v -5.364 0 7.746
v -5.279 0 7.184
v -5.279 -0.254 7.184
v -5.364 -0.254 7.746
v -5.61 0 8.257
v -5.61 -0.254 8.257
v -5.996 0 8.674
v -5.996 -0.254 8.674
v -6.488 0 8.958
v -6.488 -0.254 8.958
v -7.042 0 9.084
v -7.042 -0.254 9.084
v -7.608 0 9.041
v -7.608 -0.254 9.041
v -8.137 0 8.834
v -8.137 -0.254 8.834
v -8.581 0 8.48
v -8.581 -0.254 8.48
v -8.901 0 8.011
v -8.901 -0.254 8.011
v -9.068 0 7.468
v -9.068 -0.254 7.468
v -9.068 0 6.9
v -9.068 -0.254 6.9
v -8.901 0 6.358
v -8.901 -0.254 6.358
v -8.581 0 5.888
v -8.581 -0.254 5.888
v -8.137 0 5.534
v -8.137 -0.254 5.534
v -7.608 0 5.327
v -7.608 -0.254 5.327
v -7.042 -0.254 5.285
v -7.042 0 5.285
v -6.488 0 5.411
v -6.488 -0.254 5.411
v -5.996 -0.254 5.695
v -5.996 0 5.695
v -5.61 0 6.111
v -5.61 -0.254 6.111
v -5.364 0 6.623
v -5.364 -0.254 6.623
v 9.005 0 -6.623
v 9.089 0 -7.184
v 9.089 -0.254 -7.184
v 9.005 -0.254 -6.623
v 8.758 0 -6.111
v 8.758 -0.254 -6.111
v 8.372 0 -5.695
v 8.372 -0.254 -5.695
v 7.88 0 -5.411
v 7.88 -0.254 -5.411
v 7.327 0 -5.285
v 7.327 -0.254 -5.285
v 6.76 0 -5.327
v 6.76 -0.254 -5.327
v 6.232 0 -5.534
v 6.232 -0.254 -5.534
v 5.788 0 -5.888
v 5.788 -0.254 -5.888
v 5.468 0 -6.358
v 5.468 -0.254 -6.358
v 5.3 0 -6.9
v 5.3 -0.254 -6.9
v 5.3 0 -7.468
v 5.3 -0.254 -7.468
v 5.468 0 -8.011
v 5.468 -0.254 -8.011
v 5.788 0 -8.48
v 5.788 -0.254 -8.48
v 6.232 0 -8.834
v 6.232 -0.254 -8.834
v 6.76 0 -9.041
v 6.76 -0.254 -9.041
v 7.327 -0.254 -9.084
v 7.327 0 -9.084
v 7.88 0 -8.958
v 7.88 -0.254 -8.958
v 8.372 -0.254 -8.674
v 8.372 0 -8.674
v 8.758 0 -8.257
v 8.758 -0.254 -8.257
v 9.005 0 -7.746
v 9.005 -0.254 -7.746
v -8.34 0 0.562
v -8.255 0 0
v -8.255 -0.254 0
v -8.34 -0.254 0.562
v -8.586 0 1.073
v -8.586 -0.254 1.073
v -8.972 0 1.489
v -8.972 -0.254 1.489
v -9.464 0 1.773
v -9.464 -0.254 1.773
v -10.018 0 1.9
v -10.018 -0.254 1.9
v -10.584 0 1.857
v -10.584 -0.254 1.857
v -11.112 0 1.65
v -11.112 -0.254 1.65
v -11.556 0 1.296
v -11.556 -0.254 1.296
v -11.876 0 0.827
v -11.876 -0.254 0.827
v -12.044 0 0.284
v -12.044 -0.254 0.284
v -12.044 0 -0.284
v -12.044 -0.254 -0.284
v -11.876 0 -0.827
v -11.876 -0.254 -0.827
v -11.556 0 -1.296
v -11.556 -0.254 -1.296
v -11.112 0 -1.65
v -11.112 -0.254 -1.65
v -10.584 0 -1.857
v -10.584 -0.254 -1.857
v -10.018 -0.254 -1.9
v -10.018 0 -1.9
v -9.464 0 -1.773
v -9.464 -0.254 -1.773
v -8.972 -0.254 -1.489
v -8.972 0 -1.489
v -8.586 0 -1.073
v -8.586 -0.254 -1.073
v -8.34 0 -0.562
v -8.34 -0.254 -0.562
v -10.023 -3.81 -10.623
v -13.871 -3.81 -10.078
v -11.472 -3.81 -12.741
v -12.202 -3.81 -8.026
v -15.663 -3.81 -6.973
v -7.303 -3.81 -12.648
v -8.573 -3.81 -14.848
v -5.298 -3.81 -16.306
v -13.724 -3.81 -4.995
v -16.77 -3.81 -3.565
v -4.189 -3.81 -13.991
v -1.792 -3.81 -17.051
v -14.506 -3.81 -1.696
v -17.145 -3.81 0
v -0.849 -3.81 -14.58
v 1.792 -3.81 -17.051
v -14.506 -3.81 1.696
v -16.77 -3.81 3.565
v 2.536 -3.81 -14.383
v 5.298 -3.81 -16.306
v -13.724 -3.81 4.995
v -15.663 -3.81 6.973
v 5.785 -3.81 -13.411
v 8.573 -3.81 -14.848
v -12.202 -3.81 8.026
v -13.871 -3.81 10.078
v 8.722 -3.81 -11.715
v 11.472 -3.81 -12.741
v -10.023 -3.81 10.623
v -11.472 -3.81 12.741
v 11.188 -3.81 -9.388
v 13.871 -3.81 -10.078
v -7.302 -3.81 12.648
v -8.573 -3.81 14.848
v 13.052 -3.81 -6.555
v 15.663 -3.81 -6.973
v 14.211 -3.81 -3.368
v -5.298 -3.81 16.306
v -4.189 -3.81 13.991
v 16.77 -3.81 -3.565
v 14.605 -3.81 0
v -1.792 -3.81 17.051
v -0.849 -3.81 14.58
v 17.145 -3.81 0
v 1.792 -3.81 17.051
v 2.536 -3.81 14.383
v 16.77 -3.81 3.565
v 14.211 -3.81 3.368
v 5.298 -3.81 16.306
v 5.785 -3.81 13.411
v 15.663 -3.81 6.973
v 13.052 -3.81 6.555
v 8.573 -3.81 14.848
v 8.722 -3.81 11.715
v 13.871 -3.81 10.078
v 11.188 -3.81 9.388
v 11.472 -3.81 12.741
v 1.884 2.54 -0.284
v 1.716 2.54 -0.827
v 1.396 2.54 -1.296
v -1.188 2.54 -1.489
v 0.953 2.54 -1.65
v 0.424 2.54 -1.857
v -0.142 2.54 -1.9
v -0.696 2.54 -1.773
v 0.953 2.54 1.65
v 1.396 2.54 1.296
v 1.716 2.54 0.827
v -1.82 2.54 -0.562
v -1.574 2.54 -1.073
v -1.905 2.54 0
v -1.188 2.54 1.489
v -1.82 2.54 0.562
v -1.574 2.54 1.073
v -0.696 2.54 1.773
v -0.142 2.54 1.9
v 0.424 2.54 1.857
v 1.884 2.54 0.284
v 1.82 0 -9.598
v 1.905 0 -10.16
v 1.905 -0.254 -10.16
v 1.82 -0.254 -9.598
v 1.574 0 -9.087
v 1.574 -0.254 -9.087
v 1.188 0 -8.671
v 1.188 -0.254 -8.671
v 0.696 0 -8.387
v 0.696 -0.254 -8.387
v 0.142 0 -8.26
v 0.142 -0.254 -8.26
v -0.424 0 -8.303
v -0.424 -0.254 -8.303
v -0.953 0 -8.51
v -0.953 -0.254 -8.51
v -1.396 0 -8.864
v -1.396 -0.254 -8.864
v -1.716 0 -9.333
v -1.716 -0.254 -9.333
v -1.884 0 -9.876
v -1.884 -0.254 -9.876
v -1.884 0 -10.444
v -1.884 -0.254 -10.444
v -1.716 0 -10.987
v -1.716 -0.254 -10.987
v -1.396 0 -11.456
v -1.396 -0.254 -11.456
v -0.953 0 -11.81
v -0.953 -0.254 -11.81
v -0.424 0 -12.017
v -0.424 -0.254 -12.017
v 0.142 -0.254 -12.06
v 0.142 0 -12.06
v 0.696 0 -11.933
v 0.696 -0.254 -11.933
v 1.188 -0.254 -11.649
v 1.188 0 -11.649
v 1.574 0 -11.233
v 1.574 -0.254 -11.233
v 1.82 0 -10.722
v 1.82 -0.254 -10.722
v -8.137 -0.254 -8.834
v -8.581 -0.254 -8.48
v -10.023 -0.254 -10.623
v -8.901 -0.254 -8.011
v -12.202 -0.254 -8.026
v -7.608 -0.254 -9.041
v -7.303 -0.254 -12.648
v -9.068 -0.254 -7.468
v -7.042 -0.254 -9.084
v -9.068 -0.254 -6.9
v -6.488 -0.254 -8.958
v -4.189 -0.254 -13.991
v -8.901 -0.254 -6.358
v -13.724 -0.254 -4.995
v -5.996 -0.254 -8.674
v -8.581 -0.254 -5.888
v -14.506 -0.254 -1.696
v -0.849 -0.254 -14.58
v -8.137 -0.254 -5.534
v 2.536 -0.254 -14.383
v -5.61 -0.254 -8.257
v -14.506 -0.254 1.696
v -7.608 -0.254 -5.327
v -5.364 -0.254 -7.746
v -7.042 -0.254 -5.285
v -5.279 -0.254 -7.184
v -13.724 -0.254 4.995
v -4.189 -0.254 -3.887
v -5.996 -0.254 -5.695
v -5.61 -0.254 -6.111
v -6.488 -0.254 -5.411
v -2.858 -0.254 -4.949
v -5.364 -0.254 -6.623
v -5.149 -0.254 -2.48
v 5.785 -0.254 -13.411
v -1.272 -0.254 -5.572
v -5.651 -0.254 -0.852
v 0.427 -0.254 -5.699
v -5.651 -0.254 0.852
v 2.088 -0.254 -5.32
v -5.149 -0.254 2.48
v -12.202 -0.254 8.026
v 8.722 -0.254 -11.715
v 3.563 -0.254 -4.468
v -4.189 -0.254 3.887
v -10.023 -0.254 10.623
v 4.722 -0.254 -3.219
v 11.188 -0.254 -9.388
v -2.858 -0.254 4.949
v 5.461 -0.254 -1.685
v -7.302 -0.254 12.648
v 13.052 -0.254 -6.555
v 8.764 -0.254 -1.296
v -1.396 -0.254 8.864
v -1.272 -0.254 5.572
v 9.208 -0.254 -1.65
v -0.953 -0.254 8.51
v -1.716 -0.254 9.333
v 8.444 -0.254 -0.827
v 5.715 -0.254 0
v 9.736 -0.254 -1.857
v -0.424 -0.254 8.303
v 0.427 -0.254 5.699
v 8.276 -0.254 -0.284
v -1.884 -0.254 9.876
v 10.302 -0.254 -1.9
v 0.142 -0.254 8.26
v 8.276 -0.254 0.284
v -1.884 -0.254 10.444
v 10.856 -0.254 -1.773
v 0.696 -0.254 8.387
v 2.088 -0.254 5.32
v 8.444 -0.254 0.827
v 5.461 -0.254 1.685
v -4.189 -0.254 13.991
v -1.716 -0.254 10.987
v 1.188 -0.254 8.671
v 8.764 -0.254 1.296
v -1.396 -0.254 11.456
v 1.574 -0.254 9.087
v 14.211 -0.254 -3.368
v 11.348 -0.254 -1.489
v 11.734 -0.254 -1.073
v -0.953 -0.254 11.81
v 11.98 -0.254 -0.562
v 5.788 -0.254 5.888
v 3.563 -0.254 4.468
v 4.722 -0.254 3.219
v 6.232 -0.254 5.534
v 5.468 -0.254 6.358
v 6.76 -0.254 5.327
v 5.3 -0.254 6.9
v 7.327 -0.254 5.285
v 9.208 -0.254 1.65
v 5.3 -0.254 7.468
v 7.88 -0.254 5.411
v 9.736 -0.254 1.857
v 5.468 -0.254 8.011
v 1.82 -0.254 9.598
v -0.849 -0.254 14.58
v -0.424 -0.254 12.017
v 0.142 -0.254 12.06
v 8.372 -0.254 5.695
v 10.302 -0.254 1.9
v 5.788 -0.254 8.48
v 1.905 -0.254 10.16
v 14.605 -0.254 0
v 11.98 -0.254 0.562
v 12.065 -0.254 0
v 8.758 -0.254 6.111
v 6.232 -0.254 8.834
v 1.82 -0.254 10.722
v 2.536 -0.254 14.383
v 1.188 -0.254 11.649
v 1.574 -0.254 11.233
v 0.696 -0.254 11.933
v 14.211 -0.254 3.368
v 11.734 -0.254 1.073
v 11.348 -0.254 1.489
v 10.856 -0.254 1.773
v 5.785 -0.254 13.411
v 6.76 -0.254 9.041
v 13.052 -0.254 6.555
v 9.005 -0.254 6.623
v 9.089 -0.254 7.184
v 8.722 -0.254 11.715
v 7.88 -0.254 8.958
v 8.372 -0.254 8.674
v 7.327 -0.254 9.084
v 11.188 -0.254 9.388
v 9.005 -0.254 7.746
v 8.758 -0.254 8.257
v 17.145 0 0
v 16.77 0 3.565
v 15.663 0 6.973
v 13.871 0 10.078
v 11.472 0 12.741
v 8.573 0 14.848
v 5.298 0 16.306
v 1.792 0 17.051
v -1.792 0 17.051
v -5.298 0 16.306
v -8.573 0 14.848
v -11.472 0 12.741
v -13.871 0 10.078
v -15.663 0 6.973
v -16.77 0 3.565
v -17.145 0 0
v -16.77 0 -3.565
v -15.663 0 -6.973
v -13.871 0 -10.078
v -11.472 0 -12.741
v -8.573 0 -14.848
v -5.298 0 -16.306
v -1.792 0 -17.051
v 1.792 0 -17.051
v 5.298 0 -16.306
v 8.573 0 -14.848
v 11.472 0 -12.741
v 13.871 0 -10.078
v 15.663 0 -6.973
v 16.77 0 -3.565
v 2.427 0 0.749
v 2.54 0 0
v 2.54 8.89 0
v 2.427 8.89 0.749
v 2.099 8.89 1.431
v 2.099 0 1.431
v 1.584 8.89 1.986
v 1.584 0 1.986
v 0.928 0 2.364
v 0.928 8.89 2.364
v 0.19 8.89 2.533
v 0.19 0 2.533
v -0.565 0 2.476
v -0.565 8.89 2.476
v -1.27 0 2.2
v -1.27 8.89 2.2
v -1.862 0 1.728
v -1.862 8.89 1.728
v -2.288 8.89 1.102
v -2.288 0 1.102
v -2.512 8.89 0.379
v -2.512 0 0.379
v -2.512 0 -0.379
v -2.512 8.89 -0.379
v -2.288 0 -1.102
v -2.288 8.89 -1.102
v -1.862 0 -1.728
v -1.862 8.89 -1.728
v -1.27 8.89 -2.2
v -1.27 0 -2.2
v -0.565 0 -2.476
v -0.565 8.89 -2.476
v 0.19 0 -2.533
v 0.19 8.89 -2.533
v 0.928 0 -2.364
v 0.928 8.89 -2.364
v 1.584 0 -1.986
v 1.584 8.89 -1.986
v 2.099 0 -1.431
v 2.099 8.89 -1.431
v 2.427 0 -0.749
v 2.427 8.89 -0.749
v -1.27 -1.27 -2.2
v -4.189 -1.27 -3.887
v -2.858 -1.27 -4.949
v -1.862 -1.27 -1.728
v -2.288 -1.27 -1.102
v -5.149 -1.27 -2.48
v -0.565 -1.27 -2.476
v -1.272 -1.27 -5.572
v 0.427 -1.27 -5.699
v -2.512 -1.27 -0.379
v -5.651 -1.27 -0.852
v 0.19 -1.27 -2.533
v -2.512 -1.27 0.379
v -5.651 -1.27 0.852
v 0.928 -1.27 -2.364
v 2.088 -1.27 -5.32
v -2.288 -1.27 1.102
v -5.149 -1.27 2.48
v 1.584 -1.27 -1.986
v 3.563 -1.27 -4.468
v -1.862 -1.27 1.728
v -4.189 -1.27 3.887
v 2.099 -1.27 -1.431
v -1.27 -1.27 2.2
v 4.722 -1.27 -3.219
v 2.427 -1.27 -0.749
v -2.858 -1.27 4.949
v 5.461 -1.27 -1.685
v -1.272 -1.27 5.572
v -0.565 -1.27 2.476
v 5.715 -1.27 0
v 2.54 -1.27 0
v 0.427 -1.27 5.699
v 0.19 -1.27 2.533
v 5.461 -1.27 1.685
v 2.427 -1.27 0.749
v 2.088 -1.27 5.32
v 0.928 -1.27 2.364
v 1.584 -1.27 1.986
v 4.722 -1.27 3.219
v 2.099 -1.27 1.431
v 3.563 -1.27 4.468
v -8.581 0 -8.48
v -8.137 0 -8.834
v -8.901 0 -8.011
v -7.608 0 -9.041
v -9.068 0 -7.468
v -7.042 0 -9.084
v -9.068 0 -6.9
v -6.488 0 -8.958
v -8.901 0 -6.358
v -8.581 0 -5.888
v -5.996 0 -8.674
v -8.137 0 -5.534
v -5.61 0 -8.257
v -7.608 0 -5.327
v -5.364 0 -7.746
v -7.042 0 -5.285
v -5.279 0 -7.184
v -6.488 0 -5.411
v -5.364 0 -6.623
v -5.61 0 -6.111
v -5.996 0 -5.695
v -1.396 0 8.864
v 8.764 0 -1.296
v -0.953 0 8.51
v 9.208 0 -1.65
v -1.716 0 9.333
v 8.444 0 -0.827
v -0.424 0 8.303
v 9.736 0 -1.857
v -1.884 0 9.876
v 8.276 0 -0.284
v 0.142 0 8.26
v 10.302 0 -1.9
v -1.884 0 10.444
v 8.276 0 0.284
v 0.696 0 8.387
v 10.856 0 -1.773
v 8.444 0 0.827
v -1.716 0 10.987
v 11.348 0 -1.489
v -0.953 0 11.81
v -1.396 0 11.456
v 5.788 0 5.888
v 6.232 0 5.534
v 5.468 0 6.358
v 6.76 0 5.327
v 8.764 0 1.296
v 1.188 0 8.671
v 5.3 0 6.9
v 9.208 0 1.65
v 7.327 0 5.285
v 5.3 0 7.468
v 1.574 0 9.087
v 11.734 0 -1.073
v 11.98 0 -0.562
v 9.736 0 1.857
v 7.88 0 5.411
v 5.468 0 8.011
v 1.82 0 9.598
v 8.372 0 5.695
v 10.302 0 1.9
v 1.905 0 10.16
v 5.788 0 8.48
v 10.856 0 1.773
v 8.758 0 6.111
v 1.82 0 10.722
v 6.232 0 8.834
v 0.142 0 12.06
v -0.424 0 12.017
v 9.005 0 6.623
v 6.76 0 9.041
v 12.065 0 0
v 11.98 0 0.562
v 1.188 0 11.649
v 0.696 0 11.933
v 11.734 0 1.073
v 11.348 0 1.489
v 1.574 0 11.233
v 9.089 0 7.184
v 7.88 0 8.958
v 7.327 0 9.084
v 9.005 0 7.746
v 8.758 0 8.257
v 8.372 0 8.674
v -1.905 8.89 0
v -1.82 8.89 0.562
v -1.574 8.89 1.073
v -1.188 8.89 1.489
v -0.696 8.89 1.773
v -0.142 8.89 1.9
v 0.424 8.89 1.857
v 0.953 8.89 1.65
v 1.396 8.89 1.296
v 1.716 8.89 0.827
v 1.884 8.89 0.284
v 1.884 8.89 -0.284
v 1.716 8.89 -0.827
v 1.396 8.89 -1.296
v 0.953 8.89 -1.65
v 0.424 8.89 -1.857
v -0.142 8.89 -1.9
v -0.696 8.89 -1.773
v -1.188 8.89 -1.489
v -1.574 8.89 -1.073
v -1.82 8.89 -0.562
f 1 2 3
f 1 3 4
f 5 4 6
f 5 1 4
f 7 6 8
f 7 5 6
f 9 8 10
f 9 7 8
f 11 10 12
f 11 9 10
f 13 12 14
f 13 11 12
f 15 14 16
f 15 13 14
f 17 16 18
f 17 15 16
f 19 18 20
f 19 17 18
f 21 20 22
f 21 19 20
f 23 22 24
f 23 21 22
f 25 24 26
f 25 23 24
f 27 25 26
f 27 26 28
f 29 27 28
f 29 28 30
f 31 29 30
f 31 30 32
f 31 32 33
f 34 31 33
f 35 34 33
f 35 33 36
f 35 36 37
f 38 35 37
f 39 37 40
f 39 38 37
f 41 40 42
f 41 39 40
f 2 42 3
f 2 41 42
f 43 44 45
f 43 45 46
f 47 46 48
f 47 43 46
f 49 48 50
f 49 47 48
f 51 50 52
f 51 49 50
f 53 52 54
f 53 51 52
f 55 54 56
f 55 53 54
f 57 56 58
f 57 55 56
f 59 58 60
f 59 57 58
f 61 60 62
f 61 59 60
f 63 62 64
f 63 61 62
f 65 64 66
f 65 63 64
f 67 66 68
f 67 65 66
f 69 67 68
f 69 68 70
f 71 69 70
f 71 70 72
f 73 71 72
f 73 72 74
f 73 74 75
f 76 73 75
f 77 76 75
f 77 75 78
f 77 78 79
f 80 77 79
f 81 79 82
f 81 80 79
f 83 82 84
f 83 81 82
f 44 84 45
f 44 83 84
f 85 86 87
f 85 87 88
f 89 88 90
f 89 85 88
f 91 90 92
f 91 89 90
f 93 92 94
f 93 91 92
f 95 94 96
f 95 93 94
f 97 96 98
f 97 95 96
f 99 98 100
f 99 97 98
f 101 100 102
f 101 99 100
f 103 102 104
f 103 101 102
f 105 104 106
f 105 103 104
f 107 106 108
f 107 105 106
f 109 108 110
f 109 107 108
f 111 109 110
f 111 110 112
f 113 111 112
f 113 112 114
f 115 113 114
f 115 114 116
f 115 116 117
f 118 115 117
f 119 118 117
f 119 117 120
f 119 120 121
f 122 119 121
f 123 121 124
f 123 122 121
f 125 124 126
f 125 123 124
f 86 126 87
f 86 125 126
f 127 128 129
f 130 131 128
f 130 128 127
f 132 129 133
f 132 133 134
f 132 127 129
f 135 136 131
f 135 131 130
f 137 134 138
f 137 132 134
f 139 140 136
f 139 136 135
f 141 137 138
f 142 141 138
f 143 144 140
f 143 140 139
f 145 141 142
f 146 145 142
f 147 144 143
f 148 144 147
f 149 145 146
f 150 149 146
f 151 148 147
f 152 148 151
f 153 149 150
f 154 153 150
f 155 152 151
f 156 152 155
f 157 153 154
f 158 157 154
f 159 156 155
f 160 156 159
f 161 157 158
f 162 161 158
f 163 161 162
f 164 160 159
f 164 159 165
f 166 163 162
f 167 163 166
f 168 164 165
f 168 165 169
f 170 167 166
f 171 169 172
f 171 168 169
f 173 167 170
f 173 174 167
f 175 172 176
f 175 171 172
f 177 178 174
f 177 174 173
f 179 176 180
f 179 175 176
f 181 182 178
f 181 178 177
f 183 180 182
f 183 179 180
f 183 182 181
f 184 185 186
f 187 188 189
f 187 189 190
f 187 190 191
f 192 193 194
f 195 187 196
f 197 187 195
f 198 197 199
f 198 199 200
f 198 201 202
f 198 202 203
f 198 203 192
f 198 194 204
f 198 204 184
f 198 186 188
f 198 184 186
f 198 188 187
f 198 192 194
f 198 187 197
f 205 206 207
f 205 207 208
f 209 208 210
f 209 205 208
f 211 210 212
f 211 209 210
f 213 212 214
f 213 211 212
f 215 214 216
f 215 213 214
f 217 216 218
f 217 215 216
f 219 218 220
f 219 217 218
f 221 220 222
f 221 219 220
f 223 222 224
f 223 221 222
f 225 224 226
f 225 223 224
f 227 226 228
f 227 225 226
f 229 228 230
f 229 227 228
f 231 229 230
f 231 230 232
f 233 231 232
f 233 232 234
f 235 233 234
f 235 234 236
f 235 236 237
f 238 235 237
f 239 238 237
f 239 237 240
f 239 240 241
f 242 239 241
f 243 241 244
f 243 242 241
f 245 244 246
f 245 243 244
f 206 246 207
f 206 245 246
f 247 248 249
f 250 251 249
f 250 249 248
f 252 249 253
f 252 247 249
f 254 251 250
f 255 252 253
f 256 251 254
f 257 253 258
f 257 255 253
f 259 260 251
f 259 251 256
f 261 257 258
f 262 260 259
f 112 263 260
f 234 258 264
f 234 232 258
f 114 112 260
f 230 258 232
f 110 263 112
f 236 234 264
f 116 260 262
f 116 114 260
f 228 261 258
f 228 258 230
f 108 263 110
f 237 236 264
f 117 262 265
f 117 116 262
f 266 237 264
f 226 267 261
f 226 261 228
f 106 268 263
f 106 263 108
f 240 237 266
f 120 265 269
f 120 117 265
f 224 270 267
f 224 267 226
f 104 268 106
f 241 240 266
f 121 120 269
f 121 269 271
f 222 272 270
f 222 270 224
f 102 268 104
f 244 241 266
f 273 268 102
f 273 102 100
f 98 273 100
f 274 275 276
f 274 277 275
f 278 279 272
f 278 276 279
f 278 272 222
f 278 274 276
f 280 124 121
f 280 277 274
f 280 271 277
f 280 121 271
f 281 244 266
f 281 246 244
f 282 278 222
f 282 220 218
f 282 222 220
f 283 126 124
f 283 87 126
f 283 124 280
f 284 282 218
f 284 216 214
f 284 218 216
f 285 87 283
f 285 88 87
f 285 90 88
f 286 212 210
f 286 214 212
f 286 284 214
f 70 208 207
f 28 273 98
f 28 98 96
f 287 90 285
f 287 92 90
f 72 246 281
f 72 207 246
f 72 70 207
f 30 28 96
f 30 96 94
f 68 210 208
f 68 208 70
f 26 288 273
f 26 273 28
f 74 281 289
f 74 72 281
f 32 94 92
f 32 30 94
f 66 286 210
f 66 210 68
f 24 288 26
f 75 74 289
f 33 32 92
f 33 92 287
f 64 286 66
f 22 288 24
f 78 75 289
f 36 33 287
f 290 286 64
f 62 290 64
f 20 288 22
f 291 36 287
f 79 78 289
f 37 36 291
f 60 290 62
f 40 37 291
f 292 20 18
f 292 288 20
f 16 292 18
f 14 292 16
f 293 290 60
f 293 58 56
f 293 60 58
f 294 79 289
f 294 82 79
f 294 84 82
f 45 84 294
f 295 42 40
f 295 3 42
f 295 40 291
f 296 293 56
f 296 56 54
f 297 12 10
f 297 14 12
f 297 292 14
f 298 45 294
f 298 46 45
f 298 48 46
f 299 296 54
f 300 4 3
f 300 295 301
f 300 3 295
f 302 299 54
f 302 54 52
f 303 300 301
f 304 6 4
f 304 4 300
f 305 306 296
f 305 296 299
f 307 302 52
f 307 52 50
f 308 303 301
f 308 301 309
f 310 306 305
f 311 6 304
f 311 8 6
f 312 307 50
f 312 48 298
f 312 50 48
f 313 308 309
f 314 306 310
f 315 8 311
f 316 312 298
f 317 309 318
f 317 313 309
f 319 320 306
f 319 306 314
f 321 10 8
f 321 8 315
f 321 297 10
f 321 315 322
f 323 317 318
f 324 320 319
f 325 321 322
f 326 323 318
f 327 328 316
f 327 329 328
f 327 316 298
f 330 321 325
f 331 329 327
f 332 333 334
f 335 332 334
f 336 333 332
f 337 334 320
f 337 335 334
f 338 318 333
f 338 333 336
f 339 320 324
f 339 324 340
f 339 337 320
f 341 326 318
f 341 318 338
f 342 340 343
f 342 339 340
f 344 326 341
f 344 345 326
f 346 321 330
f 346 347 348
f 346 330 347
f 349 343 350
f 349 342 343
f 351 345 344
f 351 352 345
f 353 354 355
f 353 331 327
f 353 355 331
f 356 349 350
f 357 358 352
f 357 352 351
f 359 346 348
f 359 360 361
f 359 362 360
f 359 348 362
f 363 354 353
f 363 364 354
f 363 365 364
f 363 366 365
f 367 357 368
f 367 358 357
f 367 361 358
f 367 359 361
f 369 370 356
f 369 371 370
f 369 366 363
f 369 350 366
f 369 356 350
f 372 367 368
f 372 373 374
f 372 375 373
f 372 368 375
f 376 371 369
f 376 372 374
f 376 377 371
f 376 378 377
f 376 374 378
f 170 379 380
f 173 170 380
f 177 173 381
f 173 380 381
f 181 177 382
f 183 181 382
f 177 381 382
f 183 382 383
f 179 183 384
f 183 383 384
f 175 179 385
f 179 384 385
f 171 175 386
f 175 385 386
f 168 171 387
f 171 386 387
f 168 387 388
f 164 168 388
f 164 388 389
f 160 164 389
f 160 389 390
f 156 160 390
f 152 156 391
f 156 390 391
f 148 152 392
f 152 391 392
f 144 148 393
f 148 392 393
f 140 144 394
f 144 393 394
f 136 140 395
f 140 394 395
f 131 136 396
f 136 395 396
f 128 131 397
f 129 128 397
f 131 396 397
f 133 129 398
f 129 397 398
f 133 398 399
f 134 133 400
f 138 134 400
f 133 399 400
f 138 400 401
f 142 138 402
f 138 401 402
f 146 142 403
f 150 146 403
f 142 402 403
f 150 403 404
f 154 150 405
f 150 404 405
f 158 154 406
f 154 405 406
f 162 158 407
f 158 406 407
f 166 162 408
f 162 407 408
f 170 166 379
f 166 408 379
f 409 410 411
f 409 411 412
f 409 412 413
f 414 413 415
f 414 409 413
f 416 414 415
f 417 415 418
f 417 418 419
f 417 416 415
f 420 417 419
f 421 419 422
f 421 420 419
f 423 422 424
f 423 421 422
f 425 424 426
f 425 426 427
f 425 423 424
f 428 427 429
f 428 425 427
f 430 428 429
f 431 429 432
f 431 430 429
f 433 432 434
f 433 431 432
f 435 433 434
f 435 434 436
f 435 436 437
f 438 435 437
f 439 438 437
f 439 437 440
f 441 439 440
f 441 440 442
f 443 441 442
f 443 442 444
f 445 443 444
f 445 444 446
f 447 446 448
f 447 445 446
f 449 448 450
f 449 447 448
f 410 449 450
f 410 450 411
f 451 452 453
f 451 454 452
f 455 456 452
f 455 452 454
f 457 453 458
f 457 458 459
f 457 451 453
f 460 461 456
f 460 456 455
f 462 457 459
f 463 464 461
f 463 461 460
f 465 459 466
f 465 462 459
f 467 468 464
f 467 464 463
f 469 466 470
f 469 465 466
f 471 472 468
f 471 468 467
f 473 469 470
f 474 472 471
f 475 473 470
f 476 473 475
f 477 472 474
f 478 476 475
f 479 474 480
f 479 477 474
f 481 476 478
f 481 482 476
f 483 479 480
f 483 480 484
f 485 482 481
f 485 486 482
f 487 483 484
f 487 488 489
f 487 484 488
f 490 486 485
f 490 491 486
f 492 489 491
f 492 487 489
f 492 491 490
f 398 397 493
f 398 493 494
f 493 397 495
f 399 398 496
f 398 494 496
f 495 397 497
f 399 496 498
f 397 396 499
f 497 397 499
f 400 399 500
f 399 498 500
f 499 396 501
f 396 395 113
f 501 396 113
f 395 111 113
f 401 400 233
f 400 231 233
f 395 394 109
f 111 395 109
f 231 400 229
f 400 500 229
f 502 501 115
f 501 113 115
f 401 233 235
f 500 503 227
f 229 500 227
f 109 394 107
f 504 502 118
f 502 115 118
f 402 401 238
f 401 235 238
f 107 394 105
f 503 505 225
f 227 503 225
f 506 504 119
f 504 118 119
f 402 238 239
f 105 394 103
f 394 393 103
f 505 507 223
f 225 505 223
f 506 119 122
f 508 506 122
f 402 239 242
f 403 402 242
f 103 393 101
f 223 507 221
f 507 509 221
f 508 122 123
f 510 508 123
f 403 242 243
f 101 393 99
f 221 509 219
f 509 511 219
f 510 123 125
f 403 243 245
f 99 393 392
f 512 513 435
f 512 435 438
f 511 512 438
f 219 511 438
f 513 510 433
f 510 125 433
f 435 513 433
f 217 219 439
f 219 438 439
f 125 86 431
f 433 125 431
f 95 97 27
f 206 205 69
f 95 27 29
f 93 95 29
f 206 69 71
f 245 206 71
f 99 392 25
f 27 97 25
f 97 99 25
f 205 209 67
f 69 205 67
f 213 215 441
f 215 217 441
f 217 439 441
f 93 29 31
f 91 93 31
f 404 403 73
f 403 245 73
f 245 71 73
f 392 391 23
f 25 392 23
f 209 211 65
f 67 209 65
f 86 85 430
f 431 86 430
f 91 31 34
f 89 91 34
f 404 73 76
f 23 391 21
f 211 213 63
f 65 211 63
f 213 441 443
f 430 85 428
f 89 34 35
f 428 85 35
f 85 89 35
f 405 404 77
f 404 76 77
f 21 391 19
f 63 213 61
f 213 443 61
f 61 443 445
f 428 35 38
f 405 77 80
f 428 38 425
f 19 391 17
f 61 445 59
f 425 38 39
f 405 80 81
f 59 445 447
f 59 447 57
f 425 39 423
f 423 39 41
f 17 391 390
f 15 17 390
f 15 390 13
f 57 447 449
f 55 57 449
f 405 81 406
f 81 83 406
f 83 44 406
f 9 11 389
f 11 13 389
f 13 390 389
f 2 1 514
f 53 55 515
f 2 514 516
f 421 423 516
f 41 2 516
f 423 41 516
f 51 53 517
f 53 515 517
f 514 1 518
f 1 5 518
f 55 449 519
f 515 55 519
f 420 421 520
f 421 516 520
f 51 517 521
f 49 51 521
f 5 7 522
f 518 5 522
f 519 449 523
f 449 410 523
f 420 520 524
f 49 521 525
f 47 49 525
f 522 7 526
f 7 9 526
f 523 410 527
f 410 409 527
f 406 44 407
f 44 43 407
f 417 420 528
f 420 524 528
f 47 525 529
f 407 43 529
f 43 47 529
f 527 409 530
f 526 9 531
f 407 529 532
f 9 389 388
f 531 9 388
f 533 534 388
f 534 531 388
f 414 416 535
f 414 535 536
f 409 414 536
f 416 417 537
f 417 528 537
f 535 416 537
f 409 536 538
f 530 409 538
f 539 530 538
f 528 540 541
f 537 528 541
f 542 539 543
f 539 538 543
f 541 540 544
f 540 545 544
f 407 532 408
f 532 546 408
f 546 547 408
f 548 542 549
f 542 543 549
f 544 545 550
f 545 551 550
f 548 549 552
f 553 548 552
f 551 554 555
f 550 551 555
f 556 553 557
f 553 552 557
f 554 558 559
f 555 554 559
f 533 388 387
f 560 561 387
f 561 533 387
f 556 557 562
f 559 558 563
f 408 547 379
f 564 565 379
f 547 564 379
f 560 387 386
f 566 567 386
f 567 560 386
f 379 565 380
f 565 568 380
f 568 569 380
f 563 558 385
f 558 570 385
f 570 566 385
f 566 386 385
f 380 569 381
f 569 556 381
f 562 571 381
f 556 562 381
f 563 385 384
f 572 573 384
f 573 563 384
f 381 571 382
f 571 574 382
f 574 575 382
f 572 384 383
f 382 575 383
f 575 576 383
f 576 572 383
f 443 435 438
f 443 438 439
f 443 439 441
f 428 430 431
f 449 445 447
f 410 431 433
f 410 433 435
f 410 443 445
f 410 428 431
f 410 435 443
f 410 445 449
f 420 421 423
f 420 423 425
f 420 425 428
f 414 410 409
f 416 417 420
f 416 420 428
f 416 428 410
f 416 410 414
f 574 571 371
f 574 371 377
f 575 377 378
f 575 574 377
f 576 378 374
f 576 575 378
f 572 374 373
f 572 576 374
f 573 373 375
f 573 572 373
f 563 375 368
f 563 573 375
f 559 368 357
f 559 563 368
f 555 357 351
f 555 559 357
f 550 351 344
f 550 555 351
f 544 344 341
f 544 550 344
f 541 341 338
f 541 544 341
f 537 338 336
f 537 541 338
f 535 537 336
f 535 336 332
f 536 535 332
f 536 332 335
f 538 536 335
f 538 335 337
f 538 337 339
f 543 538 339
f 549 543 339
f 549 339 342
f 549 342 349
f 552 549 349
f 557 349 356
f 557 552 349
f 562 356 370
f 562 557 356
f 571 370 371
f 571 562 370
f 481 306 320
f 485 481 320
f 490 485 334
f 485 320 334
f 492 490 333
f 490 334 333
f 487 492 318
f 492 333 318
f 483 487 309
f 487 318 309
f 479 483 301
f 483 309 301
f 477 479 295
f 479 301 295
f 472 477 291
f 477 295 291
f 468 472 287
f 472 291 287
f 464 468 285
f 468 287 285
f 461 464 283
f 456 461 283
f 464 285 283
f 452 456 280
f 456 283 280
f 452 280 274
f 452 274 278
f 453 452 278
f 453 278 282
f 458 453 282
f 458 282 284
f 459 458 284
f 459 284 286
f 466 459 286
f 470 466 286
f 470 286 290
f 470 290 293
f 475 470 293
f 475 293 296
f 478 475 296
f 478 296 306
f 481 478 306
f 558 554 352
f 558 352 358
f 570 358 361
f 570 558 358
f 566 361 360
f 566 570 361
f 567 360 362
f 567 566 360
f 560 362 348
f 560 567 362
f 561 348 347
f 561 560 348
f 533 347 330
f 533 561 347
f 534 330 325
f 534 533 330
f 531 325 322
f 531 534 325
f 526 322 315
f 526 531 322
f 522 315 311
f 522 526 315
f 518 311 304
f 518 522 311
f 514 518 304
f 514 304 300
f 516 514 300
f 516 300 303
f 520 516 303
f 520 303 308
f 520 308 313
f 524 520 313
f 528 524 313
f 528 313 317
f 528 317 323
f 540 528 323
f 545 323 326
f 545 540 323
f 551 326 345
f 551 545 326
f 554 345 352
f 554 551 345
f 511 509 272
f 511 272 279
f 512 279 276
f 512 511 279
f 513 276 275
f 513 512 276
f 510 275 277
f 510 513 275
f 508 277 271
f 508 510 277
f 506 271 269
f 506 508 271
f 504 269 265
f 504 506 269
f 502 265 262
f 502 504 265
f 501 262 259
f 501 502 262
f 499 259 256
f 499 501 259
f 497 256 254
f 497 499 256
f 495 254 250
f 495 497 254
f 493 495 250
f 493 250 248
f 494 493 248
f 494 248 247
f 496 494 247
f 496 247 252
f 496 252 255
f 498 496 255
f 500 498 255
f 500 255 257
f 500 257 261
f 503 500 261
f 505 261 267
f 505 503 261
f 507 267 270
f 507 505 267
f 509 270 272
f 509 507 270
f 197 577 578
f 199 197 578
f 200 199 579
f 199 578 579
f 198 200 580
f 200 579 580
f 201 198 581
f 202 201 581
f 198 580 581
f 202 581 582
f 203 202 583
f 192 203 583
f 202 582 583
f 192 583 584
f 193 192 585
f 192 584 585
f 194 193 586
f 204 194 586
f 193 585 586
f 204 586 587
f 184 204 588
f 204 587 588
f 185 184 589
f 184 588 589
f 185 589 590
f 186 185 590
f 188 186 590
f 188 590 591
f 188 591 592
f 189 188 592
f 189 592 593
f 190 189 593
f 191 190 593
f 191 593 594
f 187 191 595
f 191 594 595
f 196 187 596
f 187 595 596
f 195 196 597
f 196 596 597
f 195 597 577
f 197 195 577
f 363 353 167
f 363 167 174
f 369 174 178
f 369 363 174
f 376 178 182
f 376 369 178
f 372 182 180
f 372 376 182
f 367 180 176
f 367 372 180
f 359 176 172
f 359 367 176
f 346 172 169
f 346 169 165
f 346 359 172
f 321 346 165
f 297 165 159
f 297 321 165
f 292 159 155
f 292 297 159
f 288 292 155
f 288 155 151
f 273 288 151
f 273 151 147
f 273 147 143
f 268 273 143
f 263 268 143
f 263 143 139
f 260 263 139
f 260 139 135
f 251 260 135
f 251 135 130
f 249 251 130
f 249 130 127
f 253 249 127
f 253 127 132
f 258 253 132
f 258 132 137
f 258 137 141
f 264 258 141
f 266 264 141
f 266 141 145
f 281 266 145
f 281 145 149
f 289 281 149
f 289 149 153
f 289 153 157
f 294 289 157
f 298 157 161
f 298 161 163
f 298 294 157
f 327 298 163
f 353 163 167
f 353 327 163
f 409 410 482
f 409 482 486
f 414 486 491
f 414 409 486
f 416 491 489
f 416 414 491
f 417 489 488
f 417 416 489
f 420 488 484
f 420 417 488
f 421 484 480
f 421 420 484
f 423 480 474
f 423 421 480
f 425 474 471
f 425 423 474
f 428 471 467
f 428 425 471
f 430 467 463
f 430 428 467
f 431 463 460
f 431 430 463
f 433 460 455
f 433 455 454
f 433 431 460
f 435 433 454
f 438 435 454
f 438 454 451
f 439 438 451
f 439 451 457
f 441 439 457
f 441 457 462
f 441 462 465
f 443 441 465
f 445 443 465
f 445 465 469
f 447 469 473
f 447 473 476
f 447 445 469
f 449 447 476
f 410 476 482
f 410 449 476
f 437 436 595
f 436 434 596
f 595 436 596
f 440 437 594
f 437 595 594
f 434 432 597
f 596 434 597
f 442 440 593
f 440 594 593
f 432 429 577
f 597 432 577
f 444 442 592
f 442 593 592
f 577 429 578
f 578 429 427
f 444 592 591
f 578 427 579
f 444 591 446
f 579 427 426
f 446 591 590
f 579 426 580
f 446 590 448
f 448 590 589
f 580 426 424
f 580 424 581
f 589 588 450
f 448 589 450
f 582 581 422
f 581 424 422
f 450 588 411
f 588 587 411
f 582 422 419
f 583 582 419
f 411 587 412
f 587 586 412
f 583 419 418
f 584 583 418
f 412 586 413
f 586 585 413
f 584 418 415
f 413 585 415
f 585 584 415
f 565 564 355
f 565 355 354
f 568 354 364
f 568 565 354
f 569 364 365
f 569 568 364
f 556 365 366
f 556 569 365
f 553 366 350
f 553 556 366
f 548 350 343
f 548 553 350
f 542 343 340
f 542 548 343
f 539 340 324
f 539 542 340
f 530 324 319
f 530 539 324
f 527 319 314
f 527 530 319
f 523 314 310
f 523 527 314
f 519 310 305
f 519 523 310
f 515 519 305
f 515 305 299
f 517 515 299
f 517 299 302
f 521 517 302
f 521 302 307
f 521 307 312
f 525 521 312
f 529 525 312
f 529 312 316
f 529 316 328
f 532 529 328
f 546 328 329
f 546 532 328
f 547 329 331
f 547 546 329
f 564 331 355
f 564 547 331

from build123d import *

# Parameters (mm, degrees)
F0_R     = 17.145
F0_R_2   = 14.605
F1_DEPTH = 3.81
F0_R_3   = 5.715
F0_R_4   = 2.54
F2_DEPTH = 1.27
F0_R_5   = 1.905
F3_DEPTH = 0.254
F4_DEPTH = 8.89
F5_R     = 1.905
F6_DEPTH = 6.35


with BuildPart() as f1:
    # F0 (on Front) → F1 (new body)
    with BuildSketch(Plane.XZ):
        Circle(F0_R)
        Circle(F0_R_2, mode=Mode.SUBTRACT)
    extrude(amount=F1_DEPTH)



with BuildPart() as f2:
    # F0 (on Front) → F2 (new body)
    with BuildSketch(Plane.XZ):
        Circle(F0_R_3)
        Circle(F0_R_4, mode=Mode.SUBTRACT)
    extrude(amount=F2_DEPTH)


with BuildPart() as f1_1:
    add(f1.part)

    add(f2.part)  # F3 merges F2
    # F0 (on Front) → F3 (join)
    with BuildSketch(Plane.XZ):
        Circle(F0_R_2)
        with Locations((-7.184205, -7.184205)):
            Circle(F0_R_5, mode=Mode.SUBTRACT)
        with Locations((0, -10.16)):
            Circle(F0_R_5, mode=Mode.SUBTRACT)
        with Locations((7.184205, -7.184205)):
            Circle(F0_R_5, mode=Mode.SUBTRACT)
        with Locations((-10.16, 0)):
            Circle(F0_R_5, mode=Mode.SUBTRACT)
        with Locations((-7.184205, 7.184205)):
            Circle(F0_R_5, mode=Mode.SUBTRACT)
        Circle(F0_R_3, mode=Mode.SUBTRACT)
        with Locations((7.184205, 7.184205)):
            Circle(F0_R_5, mode=Mode.SUBTRACT)
        with Locations((10.16, 0)):
            Circle(F0_R_5, mode=Mode.SUBTRACT)
        with Locations((0, 10.16)):
            Circle(F0_R_5, mode=Mode.SUBTRACT)
    extrude(amount=F3_DEPTH)

    # F0 (on Front) → F4 (join)
    with BuildSketch(Plane.XZ):
        Circle(F0_R_4)
    extrude(amount=-F4_DEPTH)

    # F5 (on face) → F6 (cut)
    with BuildSketch(Plane(origin=(0, 8.89, 0), x_dir=(-1, 0, 0), z_dir=(0, 1, 0))):
        Circle(F5_R)
    extrude(amount=-F6_DEPTH, mode=Mode.SUBTRACT)


solid = f1_1.part
